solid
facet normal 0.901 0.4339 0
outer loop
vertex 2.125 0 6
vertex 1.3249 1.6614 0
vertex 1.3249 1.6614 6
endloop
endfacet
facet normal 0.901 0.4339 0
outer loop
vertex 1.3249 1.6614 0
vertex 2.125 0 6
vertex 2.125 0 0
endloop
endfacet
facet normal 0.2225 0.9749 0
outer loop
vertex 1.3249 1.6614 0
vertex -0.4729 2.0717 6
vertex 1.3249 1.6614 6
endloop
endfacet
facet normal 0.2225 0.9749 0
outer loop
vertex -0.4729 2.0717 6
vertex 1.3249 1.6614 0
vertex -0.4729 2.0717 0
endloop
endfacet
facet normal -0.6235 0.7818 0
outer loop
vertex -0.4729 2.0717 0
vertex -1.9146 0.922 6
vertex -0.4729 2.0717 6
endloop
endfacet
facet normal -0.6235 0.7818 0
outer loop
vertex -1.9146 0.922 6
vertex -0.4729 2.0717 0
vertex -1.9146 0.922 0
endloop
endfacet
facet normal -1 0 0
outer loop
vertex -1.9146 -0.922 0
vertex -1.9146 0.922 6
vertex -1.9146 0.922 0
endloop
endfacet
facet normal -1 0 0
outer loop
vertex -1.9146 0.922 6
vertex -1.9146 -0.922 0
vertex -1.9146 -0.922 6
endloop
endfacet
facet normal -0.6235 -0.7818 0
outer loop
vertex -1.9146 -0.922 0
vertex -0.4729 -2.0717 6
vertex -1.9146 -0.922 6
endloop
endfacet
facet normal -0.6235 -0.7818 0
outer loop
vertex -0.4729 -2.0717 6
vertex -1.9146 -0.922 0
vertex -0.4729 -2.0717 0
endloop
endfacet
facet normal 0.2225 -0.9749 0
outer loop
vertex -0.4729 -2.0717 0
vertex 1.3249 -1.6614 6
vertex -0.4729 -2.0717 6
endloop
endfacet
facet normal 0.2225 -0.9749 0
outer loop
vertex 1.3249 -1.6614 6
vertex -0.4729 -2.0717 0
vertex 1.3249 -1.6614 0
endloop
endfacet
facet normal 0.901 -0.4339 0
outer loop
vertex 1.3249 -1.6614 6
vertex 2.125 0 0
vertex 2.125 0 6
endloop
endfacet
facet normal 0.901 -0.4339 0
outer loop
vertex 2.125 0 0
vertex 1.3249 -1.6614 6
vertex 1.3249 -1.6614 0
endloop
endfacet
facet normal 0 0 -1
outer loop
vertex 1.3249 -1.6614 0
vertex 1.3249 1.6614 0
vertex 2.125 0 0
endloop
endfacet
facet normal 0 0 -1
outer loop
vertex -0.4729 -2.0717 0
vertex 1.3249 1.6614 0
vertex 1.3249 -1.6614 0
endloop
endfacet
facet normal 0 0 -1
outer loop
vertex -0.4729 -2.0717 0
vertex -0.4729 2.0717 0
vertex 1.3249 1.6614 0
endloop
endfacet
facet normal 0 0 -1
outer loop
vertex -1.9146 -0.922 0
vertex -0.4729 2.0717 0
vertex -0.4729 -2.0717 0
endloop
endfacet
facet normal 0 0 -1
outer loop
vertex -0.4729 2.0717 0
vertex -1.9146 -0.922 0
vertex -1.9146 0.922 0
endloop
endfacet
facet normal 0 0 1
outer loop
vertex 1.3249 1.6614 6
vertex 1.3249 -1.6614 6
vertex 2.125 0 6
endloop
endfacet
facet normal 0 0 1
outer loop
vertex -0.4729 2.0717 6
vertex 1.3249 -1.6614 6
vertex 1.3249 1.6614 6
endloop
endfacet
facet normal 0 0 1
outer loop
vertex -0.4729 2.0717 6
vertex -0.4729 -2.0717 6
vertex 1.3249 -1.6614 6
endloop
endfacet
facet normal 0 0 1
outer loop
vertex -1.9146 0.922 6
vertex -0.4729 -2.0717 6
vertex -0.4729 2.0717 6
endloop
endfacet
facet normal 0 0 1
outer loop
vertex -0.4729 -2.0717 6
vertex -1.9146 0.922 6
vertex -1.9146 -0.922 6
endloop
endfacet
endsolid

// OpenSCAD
// file: ../configurations/global.scad
// Display
display_buttons = true;

wood_throw_m3_diameter = 3.3;

// Generics
he14female_z_size = 8.5;
insert_throw_diameter = 4.25;
insert_throw_length = 6;
throw_m3_diameter = 3.5;

mil = 2.54;

// external size
case_external_x_size = 110; // 105
case_external_y_size = 55; // 66
case_external_z_size = 60;
case_external_panes_thickness = 4.8;


housing_facades_throws_diameter = wood_throw_m3_diameter;

facade_front_round_edges_radius = 5;
facade_throws_margin = 5;

facade_speaker_holder_z_size = 1;

speaker_border_offset = 30; // 25

// speakers
speaker_1_x_y_coords = [
    speaker_border_offset,
    case_external_y_size / 2
];

speaker_2_x_y_coords = [
    case_external_x_size - speaker_border_offset,
    case_external_y_size / 2
];

speakers_x_y_coords = [
    speaker_1_x_y_coords,
    speaker_2_x_y_coords
];


// facade corners
facade_fn = 100;

// Button
wood_facade_top_on_off_button_throw_diameter = 12.3;
facade_top_on_off_button_throw_diameter = 12.4;

// USB Connector
usb_connector_diameter = 10.65;
usb_connector_throw_diameter = 10.9;
usb_connector_throw_fn = 250;

motherBoardComponent_breadboard_camera_point_position = [5, 3];
breadboard_z_size = 1.5;


onOffButton_position_coords = [15, 30];
chargerConnector_position_coords = [15, 15];

control_buttons_position_coords_list = [
    [19 * 2, case_external_y_size, case_external_z_size / 2],
    [19 * 3, case_external_y_size, case_external_z_size / 2],
    [19 * 4, case_external_y_size, case_external_z_size / 2]
];

onOffButtonThrowEnveloppe_fn = 250;
boltEnveloppe_fn = 100;

// Housing border
housingBorderPiece_border_thickness = 4;

Battery_coords_position = [23, 4];

// Usb Connector
usbConnectorThrowEnveloppe_margin = 0.25;
usbConnectorThrowEnveloppe_length = 20;
usbConnectorThrowEnveloppe_fn = 100;


max98357_center_coords = [20, 30];
// main file
include <../configurations/global.scad>

module insertThrowEnveloppe() {
    cylinder(d = 4.25, h = insert_throw_length, center = false);
}

insertThrowEnveloppe();
